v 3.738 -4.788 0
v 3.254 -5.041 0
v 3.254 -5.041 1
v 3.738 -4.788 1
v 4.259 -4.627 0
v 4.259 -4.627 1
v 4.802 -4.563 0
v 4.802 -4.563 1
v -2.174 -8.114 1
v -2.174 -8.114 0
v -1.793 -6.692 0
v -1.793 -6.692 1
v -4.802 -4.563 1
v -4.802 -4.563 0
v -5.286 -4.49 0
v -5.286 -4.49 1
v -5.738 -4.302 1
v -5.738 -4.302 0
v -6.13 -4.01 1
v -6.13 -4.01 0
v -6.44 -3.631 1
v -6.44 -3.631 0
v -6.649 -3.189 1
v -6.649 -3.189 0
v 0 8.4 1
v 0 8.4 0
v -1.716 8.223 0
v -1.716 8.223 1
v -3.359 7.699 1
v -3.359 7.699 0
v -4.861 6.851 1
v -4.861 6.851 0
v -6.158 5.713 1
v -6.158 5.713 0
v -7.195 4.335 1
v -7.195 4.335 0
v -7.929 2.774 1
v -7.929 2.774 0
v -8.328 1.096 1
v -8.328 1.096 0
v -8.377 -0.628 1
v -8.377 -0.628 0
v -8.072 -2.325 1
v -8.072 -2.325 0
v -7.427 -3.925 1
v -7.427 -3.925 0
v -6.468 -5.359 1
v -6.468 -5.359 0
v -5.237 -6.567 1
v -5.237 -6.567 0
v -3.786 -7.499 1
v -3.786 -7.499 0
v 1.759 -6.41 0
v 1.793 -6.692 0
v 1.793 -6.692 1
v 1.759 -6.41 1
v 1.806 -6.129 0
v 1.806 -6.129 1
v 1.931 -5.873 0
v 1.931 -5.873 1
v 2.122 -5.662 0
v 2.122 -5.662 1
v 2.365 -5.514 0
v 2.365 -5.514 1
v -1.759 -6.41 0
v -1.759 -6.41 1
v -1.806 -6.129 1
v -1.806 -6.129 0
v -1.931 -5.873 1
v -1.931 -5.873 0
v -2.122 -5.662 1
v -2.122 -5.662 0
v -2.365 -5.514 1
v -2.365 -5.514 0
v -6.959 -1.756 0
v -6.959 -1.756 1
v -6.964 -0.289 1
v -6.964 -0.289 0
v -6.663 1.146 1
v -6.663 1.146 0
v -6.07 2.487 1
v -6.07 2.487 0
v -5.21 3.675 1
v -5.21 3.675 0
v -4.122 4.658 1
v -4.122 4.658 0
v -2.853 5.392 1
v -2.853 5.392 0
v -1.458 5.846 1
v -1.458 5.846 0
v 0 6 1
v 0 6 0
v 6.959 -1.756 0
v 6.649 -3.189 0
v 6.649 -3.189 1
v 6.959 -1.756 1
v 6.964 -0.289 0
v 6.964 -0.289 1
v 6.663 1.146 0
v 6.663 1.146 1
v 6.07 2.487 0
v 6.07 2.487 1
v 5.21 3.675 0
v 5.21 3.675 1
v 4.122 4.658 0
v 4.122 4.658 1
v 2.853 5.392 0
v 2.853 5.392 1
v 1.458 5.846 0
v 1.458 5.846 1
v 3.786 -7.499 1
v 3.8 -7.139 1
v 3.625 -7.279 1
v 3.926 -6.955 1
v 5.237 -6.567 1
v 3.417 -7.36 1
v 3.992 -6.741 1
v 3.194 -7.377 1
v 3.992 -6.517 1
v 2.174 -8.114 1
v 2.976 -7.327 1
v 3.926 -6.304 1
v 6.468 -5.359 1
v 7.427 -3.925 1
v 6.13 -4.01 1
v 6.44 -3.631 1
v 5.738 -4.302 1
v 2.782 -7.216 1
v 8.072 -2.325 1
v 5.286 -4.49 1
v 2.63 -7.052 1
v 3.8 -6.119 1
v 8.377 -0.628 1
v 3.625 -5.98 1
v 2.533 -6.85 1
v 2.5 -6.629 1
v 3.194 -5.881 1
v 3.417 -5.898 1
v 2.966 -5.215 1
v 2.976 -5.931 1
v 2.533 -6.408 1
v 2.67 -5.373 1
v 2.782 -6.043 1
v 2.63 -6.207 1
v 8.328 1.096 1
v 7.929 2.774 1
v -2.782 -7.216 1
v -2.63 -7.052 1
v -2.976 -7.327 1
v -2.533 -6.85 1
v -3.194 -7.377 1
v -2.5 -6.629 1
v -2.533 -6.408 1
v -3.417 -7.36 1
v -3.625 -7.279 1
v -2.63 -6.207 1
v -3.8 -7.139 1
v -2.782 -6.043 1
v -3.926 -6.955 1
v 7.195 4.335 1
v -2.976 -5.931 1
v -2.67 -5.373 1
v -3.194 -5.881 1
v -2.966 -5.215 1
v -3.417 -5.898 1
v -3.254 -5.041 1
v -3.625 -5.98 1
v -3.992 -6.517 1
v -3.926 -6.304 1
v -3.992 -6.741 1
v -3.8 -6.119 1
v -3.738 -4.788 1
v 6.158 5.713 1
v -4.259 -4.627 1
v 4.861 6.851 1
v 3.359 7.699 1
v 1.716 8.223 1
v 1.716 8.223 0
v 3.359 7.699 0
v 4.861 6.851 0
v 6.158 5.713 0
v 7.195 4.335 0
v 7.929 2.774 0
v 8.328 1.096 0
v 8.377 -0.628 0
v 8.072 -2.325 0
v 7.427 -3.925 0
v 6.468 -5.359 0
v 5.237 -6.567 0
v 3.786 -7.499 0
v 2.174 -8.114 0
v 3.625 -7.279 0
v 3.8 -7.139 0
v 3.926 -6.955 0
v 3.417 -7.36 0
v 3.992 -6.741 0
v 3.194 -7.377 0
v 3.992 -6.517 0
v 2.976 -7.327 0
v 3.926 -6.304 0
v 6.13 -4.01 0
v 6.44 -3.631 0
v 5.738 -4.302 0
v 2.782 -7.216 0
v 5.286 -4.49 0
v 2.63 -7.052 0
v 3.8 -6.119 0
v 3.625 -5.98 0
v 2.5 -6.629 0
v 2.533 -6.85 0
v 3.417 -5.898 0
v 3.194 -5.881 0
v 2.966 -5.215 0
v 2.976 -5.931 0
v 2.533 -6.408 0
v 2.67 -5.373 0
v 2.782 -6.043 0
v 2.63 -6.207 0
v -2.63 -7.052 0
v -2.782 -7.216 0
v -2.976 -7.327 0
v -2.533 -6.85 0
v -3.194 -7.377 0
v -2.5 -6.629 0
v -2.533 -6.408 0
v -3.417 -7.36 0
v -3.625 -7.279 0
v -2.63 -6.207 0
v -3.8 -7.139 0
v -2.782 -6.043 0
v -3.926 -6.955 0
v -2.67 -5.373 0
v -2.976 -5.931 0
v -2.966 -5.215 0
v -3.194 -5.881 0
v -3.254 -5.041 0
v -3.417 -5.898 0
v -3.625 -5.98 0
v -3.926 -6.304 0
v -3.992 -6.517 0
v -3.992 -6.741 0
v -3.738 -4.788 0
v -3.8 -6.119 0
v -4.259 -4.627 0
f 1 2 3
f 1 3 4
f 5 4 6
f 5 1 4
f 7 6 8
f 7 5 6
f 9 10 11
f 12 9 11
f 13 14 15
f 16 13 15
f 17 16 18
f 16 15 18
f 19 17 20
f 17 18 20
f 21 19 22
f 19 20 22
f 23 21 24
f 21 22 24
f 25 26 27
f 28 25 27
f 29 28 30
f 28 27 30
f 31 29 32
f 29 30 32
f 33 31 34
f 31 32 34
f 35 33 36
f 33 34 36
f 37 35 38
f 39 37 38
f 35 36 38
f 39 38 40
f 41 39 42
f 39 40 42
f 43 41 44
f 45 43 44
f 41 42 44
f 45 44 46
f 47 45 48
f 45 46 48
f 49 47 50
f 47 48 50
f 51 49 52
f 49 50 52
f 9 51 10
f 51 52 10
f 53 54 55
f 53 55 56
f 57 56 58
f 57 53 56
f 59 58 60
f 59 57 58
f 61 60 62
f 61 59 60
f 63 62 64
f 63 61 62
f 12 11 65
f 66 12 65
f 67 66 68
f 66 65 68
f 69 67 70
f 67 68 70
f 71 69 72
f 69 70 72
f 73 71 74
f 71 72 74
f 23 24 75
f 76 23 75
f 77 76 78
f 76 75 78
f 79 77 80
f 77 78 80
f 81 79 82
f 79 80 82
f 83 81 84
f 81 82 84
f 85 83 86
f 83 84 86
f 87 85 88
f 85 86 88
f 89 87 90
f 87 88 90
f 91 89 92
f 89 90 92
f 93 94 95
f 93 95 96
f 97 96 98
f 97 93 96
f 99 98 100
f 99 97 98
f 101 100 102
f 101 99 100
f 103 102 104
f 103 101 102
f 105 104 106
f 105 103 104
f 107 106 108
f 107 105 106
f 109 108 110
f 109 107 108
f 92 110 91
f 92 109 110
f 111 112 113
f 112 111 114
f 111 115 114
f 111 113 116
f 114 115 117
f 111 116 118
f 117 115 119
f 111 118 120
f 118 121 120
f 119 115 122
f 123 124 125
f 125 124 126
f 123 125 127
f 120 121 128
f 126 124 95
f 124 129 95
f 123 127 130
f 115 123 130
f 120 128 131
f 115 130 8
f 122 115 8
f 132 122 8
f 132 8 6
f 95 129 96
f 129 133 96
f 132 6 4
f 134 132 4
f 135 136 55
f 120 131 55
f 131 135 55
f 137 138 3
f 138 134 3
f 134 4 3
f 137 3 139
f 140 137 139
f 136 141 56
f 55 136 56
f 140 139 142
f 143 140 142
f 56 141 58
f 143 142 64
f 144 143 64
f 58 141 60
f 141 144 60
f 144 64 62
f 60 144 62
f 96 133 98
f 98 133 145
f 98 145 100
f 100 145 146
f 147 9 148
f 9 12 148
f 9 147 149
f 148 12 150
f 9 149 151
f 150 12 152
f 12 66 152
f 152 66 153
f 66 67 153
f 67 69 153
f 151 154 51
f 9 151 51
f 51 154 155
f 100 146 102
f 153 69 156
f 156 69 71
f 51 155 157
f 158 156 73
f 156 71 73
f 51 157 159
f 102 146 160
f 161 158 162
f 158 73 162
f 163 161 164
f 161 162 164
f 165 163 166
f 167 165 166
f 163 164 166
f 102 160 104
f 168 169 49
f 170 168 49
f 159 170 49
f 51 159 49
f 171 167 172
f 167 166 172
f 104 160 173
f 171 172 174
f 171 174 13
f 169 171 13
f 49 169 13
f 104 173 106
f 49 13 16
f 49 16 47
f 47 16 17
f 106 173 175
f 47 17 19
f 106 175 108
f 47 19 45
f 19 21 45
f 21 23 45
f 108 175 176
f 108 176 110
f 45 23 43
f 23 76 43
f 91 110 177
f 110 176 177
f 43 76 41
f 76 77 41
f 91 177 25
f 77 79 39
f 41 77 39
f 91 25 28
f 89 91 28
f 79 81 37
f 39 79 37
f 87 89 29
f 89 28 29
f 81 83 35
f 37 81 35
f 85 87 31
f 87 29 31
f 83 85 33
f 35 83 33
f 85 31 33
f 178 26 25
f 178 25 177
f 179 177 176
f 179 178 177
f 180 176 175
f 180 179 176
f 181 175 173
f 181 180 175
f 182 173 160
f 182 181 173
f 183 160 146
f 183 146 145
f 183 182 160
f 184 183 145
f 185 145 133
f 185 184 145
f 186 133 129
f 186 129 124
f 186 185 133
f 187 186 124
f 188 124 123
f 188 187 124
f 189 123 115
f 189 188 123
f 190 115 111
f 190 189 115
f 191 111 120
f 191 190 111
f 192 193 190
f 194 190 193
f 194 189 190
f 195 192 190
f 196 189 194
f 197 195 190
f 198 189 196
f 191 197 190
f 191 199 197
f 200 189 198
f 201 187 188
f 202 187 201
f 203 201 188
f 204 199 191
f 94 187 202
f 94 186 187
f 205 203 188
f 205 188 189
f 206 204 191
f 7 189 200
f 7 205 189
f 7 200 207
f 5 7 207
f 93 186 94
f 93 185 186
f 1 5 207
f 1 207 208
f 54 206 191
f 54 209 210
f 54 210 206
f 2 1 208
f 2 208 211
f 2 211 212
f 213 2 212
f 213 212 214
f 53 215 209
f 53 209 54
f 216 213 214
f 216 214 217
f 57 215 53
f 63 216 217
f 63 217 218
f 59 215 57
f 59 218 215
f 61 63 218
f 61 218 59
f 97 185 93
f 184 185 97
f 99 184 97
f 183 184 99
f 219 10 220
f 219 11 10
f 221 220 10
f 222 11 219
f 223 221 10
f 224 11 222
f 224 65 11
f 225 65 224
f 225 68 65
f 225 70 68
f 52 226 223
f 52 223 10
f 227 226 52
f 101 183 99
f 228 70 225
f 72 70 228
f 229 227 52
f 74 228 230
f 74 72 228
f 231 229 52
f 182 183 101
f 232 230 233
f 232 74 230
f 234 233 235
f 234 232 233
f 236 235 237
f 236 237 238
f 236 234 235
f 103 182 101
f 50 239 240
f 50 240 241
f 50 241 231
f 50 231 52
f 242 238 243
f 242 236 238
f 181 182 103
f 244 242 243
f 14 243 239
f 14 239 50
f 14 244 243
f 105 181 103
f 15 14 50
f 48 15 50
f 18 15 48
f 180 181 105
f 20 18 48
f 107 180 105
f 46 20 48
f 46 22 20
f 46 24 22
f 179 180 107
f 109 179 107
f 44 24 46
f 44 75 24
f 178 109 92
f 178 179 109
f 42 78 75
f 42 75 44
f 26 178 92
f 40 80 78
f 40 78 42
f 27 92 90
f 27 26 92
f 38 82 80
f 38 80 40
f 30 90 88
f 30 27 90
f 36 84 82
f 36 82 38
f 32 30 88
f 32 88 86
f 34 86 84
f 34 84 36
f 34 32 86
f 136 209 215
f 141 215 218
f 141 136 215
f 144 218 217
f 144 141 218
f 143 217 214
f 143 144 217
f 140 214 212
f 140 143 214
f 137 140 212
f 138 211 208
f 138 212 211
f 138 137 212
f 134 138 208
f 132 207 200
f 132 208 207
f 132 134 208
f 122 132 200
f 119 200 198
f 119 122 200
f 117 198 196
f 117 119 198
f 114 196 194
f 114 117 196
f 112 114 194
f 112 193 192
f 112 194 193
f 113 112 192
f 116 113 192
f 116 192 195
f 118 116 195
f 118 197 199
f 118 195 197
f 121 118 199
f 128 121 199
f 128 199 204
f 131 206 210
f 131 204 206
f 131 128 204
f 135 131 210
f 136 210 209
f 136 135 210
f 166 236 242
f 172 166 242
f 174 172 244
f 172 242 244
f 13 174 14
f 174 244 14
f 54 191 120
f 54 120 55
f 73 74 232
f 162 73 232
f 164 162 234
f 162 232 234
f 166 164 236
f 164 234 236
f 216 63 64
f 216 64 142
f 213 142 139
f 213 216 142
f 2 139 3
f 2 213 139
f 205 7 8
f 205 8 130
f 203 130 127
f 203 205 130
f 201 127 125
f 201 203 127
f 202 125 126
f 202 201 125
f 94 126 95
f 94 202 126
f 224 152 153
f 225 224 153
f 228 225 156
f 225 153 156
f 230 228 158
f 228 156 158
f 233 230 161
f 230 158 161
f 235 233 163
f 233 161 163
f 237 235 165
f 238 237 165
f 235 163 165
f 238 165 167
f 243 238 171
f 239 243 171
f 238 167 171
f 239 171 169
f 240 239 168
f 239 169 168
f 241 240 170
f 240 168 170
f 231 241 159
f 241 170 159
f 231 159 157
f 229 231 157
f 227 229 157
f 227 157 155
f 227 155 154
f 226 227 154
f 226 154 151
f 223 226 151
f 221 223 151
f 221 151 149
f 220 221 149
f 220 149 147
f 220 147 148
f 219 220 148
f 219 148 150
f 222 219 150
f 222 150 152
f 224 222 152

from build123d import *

# Parameters (mm, degrees)
BASE_EXTRUSION_DEPTH    = 1
ESQUISSE2_R             = 0.75
ENL_V_MAT_EXTRU_1_DEPTH = 2


with BuildPart() as part:
    # Esquisse1 → Base-Extrusion (new body)
    with BuildSketch(Plane.XY):
        with BuildLine():
            Line((-2.174079979, -8.113776941), (-1.793150944, -6.69213043))
            ThreePointArc((-1.793150944, -6.69213043), (-1.859468641, -5.996613305), (-2.364922946, -5.514266901))
            ThreePointArc((-2.364922946, -5.514266901), (-2.819293841, -5.296374443), (-3.253778531, -5.041123414))
            ThreePointArc((-3.253778531, -5.041123414), (-3.994900026, -4.695430516), (-4.80184043, -4.562720925))
            ThreePointArc((-4.80184043, -4.562720925), (-5.942925253, -4.168164446), (-6.649004393, -3.188776046))
            ThreePointArc((-6.649004393, -3.188776046), (-5.671041894, 3.103569646), (0, 6))
            Line((0, 6), (0, 8.4))
            ThreePointArc((0, 8.4), (-8.328136836, 1.096420015), (-2.174079979, -8.113776941))
        make_face()
    base_extrusion = extrude(amount=BASE_EXTRUSION_DEPTH)

    # Symétrie1: Base-Extrusion across Right Plane
    add(base_extrusion.mirror(Plane(origin=(0, 0, 0), x_dir=(0, 0, -1), z_dir=(1, 0, 0))))

    # Esquisse2 → Enlèv. mat.-Extru.1 (cut, through all)
    with BuildSketch(Plane.XY.offset(1)):
        with Locations((-3.25, -6.629165125)):
            Circle(ESQUISSE2_R)
    enl_v_mat_extru_1 = extrude(amount=-ENL_V_MAT_EXTRU_1_DEPTH, mode=Mode.SUBTRACT)

    # Symétrie2: Enlèv. mat.-Extru.1 across plane
    add(enl_v_mat_extru_1.mirror(Plane(origin=(0, 0, 0), x_dir=(0, 0, 1), z_dir=(1, 0, 0))), mode=Mode.SUBTRACT)


solid = part.part
